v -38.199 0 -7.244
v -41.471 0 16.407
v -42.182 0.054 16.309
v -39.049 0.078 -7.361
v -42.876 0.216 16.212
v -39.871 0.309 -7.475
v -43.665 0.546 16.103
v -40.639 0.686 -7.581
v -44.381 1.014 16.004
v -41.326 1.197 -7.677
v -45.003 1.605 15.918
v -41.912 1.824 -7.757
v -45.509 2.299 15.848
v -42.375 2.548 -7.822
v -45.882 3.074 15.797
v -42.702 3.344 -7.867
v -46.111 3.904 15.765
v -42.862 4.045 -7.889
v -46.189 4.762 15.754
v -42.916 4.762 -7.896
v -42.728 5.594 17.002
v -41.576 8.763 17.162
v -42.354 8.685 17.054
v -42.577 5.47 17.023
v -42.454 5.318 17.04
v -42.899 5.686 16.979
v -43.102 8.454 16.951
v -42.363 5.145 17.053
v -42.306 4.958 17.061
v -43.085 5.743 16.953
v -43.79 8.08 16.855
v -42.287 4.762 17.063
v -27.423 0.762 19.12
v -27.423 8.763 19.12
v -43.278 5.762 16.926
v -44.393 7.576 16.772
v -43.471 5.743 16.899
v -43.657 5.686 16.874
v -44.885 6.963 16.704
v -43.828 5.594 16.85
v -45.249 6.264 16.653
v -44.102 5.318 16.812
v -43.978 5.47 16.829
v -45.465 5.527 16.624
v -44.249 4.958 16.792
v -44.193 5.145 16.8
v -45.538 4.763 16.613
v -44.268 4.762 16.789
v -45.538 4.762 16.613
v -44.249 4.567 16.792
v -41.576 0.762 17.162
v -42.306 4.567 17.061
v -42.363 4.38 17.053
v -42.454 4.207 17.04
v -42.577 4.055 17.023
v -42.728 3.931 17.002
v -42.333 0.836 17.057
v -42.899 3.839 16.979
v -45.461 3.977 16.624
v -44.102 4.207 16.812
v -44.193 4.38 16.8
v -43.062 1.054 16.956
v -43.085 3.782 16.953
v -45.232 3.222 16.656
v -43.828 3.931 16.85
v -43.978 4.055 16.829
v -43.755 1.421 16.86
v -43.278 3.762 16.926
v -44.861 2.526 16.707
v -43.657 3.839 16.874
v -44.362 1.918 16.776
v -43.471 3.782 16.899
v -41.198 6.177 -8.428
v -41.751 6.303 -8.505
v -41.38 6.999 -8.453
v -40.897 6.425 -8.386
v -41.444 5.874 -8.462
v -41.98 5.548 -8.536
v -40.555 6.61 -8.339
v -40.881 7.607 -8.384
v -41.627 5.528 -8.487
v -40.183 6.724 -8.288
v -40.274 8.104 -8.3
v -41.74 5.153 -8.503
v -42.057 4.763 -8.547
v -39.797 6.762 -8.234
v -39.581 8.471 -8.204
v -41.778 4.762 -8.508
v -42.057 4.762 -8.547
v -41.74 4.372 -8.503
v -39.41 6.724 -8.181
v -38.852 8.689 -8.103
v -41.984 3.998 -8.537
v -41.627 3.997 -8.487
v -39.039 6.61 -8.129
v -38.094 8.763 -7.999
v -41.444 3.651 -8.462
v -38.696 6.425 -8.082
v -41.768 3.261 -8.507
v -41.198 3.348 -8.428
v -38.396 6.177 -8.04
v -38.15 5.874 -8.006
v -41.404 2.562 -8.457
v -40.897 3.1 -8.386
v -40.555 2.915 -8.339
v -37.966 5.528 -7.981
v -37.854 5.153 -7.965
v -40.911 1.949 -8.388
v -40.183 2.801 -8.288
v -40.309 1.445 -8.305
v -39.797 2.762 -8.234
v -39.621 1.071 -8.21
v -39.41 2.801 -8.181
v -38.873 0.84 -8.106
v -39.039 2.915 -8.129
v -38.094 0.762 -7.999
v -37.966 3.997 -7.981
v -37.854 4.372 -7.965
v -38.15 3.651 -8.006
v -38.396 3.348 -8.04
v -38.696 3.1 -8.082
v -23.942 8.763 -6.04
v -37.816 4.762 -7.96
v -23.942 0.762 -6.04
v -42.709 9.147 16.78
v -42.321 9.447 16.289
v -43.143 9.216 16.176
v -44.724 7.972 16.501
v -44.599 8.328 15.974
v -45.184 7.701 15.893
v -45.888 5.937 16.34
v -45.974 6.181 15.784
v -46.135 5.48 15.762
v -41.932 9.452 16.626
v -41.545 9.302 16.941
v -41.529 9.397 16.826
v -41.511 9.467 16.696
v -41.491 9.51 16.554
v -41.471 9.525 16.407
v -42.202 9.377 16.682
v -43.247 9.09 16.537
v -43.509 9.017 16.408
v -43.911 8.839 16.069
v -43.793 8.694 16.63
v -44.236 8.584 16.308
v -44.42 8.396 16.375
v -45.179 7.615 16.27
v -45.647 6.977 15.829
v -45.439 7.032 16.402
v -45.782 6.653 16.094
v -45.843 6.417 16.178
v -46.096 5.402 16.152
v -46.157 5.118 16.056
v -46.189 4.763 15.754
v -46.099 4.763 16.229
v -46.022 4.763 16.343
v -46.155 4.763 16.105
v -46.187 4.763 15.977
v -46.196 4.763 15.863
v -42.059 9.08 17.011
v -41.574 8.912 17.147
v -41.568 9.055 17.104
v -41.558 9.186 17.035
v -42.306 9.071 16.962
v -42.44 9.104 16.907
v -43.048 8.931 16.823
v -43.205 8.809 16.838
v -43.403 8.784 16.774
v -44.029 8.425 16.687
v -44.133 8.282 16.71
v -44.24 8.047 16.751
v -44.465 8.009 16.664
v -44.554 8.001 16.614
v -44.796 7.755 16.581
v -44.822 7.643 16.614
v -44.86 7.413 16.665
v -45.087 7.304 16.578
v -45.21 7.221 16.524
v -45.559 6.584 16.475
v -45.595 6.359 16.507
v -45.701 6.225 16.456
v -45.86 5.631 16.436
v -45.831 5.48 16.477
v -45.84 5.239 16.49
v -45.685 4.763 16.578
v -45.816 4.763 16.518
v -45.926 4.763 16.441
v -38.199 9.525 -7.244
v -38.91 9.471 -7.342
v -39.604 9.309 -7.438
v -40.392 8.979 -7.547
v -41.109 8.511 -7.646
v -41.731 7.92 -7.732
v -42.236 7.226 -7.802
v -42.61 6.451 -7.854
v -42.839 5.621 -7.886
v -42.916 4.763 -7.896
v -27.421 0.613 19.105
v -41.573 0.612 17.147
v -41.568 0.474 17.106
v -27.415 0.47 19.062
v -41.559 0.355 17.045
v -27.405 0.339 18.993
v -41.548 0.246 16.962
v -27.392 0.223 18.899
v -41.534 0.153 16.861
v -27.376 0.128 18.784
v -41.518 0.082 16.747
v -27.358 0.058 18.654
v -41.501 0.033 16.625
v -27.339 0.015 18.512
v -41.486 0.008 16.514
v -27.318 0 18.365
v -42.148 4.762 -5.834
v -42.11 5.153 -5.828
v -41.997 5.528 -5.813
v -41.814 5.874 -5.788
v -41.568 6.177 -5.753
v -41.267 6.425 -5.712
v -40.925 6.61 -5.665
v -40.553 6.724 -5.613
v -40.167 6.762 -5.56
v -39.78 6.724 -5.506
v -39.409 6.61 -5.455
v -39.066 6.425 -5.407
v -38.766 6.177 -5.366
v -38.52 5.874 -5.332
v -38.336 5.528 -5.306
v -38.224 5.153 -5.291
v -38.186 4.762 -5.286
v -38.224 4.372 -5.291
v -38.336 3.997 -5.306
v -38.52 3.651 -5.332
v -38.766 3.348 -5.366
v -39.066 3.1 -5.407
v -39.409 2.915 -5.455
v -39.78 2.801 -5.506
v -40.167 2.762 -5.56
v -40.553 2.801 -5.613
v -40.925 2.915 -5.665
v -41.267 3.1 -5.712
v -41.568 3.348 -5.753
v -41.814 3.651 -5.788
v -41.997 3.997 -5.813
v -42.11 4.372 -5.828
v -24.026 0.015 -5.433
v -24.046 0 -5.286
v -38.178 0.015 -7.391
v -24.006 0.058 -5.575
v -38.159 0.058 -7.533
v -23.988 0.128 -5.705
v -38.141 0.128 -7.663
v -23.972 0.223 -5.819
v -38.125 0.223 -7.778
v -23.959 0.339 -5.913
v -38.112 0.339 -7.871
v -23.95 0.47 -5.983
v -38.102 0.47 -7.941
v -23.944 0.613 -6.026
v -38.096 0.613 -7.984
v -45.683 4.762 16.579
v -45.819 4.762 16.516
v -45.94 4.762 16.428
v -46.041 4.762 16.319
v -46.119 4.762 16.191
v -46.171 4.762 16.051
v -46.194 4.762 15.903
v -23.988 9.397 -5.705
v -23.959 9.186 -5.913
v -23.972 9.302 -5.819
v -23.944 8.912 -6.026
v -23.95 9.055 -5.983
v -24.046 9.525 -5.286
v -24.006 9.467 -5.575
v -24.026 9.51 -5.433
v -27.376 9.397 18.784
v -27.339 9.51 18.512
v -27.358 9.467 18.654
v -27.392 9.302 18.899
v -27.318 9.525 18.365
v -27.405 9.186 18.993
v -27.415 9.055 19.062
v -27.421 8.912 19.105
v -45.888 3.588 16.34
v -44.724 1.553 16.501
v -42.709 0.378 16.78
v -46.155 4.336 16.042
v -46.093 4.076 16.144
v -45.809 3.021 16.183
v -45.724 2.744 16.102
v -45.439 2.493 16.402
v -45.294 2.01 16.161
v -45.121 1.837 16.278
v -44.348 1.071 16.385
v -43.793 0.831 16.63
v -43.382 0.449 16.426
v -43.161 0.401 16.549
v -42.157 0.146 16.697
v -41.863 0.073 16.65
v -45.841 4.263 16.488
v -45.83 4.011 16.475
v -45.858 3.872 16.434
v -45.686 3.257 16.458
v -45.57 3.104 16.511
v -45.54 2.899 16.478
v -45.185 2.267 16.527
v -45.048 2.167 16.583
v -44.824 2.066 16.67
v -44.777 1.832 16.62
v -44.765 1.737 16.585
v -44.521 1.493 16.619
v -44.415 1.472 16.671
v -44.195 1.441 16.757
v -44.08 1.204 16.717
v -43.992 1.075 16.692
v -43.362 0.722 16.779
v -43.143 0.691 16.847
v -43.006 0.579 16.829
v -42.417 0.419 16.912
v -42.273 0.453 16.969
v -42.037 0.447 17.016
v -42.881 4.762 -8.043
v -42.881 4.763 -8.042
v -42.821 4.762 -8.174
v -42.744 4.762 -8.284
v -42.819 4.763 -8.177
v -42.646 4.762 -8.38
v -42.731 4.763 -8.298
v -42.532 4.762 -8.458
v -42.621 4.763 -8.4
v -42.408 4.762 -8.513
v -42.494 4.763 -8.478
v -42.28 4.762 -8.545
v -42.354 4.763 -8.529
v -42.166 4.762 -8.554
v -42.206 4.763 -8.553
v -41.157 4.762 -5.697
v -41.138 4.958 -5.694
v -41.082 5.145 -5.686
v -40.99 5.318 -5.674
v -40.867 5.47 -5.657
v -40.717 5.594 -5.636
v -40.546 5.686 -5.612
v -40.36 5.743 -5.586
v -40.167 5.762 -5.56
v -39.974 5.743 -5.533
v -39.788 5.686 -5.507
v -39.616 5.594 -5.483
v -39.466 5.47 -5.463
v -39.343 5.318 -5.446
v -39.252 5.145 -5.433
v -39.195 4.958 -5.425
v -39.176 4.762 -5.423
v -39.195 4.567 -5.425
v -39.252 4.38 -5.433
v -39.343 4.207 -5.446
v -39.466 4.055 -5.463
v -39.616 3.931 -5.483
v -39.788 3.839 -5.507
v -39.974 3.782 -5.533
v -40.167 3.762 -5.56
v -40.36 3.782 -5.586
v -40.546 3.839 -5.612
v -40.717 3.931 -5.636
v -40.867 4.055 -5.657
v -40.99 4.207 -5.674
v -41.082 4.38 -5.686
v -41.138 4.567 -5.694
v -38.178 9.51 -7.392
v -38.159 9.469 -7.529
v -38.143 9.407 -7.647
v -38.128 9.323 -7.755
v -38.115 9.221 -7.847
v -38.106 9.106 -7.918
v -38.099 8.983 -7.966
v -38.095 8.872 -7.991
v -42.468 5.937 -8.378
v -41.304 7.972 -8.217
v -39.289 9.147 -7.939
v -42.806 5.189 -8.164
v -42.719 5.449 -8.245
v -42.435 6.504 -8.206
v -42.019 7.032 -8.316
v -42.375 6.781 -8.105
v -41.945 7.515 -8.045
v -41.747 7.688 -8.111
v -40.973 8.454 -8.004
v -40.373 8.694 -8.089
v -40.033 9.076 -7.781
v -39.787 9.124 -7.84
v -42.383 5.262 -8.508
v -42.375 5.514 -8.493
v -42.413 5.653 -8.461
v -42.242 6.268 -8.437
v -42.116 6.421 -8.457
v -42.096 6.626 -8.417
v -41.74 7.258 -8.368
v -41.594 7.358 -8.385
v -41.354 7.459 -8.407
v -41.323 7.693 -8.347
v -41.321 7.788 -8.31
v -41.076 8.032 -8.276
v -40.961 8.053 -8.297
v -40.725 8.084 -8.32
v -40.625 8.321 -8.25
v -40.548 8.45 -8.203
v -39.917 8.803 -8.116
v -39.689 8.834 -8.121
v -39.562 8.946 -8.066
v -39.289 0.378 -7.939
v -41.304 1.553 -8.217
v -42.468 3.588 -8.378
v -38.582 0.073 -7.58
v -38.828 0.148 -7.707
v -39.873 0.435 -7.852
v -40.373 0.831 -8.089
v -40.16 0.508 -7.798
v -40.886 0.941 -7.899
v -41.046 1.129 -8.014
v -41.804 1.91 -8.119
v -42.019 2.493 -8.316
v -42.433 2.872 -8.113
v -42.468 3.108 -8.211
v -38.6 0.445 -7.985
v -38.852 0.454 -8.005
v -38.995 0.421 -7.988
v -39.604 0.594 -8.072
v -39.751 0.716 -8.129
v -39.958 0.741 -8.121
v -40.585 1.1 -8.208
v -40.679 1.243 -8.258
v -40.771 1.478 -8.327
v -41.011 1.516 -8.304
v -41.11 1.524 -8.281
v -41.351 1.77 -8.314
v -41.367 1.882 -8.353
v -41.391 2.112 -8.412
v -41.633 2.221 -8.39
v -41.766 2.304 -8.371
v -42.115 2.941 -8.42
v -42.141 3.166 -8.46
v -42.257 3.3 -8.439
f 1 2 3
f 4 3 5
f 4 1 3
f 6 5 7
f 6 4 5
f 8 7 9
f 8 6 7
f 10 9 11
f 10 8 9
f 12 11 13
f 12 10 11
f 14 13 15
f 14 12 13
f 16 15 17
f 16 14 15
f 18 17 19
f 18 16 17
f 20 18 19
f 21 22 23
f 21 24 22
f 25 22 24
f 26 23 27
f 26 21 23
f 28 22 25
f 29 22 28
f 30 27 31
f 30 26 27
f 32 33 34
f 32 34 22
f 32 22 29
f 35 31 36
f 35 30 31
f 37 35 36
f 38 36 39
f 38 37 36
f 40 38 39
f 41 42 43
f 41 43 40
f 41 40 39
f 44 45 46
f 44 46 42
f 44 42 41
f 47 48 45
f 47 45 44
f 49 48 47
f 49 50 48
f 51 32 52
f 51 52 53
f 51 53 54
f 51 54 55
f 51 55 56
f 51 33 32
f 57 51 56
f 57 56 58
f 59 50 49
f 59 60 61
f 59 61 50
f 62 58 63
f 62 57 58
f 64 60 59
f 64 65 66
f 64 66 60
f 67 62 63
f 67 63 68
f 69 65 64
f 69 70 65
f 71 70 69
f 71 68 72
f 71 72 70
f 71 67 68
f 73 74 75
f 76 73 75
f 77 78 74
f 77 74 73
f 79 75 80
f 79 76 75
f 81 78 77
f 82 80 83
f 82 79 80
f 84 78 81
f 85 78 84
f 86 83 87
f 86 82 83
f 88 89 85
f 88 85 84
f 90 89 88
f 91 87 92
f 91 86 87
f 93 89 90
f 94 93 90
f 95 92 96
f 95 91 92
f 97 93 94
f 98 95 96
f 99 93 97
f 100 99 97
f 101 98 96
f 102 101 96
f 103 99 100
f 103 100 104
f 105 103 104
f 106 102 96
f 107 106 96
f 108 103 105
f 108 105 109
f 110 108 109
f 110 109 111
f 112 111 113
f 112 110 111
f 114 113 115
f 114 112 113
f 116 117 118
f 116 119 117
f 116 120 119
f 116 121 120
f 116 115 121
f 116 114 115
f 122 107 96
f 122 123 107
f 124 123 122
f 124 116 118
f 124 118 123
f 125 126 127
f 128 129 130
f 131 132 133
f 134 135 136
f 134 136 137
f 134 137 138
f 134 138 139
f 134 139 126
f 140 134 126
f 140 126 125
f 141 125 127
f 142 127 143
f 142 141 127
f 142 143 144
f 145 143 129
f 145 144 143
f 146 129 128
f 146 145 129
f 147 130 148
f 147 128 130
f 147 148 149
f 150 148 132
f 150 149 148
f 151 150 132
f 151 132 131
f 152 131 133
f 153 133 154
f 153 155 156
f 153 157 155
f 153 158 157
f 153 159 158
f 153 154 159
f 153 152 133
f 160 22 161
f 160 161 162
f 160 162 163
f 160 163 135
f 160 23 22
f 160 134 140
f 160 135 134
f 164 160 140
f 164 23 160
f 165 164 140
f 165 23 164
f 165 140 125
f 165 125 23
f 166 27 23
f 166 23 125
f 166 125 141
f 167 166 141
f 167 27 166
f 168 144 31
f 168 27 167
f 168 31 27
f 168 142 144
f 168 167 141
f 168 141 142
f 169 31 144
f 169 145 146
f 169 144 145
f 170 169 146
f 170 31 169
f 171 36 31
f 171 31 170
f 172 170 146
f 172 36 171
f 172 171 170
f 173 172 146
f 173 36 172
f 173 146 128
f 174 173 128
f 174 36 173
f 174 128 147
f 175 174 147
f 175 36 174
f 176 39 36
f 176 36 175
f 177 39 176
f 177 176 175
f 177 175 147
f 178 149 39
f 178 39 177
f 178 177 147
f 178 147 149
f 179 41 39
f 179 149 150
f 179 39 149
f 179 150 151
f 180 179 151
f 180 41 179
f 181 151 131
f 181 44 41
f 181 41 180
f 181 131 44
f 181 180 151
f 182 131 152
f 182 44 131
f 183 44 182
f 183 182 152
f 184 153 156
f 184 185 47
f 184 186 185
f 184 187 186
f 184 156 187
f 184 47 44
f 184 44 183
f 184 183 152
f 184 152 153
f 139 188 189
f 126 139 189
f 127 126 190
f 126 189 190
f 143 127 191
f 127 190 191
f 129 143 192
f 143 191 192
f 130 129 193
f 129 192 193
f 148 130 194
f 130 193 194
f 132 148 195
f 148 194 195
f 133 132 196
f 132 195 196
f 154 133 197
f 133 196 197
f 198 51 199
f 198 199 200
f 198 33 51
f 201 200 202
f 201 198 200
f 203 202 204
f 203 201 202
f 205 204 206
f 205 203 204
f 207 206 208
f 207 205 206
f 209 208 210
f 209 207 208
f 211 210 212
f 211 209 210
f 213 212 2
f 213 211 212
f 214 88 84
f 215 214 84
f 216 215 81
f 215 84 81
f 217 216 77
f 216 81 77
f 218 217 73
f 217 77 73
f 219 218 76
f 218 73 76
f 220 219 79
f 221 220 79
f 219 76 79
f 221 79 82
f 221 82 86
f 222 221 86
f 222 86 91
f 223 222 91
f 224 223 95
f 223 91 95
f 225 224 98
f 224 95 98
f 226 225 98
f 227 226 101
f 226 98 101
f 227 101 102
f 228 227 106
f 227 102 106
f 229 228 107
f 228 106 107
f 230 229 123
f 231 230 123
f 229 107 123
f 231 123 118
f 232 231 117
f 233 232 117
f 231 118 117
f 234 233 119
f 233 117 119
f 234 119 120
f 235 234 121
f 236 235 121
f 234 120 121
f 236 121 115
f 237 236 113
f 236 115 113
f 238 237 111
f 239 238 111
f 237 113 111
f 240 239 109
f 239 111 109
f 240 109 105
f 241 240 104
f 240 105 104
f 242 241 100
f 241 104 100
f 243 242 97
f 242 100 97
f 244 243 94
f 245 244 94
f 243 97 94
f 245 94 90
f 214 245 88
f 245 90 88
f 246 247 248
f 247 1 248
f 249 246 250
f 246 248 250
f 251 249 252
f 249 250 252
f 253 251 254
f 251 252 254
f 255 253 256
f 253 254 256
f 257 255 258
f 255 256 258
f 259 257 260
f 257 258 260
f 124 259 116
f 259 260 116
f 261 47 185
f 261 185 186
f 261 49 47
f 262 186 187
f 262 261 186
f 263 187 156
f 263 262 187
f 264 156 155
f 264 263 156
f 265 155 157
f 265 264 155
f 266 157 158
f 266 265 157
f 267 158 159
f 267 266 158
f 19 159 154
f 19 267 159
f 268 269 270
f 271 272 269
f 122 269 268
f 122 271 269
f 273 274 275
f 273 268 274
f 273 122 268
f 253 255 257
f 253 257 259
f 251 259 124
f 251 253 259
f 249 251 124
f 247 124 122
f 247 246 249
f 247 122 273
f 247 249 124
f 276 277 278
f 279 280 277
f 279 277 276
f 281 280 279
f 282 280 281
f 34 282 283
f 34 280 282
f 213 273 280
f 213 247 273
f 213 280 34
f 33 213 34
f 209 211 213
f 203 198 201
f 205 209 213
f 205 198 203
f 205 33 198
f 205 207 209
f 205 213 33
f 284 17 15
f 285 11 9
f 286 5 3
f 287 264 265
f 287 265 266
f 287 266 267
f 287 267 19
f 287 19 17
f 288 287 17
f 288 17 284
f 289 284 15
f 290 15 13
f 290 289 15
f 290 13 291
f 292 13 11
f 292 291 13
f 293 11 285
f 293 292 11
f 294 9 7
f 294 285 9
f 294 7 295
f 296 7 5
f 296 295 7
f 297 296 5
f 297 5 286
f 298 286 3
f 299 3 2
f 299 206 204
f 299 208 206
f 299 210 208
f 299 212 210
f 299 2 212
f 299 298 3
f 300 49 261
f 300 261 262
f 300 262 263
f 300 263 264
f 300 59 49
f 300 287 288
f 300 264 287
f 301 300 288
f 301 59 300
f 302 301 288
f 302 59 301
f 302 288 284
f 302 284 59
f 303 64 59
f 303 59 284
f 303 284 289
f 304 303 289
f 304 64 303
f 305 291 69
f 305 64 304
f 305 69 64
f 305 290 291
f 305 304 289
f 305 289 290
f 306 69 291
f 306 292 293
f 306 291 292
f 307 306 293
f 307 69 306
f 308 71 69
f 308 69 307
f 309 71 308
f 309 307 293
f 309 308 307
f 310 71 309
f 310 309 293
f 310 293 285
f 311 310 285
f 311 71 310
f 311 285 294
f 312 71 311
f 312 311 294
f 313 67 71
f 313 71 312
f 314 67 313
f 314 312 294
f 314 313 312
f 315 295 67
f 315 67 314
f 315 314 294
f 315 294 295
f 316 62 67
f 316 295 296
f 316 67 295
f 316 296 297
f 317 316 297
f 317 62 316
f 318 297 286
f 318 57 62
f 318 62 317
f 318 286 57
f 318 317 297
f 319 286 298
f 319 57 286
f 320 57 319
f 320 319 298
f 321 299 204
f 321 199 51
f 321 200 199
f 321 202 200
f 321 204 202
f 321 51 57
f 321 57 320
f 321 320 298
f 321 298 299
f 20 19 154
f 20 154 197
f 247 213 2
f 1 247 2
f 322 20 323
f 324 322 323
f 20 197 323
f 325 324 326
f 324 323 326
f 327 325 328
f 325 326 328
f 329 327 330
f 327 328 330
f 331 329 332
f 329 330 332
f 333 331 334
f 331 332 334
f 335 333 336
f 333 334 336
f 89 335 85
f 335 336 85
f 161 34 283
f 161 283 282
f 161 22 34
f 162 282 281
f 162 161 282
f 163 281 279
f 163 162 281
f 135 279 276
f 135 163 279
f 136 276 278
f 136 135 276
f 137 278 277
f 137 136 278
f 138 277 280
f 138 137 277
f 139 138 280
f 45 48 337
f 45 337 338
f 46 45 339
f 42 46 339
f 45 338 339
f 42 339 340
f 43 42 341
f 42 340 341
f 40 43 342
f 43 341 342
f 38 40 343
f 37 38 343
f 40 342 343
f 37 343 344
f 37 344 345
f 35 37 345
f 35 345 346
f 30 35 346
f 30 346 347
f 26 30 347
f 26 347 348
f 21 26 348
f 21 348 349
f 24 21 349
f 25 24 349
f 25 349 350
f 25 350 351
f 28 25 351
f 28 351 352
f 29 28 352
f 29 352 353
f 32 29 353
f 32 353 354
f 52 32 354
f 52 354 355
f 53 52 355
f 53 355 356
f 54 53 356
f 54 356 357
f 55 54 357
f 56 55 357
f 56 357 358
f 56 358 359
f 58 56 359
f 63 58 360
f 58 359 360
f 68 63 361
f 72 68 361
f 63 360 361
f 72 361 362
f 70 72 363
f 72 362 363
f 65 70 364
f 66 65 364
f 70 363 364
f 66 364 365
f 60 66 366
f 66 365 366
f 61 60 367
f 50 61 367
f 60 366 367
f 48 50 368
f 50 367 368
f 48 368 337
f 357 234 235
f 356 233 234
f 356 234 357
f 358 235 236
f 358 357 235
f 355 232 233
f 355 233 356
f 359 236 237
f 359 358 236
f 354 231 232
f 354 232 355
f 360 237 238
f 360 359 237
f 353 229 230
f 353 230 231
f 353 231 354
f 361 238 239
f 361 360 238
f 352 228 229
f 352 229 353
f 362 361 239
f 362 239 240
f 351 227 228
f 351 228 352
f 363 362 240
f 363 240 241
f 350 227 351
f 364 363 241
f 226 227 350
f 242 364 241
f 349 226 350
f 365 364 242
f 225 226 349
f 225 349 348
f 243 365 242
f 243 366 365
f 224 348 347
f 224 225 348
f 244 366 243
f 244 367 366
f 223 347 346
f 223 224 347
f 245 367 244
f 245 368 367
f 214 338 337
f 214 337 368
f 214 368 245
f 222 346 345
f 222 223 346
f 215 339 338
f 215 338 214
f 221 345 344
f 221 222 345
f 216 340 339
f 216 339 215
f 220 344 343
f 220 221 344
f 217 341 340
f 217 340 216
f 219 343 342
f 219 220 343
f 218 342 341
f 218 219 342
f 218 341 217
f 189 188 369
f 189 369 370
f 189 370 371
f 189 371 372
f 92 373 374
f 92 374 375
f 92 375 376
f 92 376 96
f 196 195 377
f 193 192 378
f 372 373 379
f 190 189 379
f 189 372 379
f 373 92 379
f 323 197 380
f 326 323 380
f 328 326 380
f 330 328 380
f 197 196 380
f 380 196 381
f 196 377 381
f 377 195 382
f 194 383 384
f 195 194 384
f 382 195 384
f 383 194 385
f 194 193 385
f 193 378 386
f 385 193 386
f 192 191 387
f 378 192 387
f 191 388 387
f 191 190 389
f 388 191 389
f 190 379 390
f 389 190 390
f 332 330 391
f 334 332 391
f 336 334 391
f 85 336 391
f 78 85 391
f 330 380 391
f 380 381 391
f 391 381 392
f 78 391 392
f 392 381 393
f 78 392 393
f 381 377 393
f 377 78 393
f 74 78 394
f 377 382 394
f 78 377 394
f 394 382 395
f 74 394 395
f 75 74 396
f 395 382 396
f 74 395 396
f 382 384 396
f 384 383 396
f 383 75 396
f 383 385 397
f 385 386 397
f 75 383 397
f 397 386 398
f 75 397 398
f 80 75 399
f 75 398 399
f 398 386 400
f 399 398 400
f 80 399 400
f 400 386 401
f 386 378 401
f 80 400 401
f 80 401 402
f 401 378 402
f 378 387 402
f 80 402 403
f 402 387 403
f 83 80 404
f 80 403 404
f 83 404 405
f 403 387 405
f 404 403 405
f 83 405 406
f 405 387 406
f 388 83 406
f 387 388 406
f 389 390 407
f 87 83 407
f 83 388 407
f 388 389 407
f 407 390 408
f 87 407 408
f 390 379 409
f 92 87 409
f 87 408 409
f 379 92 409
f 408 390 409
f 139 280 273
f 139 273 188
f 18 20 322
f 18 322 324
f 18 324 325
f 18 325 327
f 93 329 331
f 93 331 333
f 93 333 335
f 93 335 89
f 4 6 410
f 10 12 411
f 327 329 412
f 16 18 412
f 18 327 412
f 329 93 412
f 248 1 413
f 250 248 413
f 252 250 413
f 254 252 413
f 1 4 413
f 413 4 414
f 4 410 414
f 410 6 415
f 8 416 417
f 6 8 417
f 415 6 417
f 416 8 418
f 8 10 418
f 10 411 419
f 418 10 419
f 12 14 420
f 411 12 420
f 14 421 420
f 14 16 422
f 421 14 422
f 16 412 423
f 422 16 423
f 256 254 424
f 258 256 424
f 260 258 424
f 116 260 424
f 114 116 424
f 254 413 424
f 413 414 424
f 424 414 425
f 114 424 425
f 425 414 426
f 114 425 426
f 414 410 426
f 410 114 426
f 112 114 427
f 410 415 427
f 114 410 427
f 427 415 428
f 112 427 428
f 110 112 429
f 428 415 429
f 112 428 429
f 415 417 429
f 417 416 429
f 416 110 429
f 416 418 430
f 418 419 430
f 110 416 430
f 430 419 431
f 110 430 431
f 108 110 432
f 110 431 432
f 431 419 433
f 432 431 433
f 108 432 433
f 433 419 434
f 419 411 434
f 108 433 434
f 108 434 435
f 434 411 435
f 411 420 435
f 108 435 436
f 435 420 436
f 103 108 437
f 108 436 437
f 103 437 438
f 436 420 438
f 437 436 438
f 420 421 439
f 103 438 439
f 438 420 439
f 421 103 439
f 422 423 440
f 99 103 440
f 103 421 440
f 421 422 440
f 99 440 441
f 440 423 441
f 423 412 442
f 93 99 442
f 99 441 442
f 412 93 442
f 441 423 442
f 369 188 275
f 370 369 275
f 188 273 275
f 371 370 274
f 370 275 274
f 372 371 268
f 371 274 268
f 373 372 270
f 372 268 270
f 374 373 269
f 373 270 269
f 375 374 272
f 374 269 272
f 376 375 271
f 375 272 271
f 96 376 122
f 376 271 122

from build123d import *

# Parameters (mm, degrees)
BOSS_EXTRUDE1_DEPTH = 9.525
SKETCH3_R           = 2
CUT_EXTRUDE1_DEPTH  = 2.7
SKETCH4_R           = 1
CUT_EXTRUDE2_DEPTH  = 51.984772229
FILLET2_R           = 4.7625
FILLET3_R           = 0.762


with BuildPart() as part:
    # Sketch1 → Boss-Extrude1 (new body)
    with BuildSketch(Plane(origin=(0, 0, 0), x_dir=(1, 0, 0), z_dir=(0, 1, 0))):
        Polygon((-27.422743224, -19.119856123), (-46.29298428, -16.509012872), (-42.811859946, 8.651308536), (-23.941618889, 6.040465285), align=None)
    extrude(amount=BOSS_EXTRUDE1_DEPTH)

    # Sketch3 → Cut-Extrude1 (cut)
    with BuildSketch(Plane(origin=(0.316670388, 0, -2.684144047), x_dir=(-0.9905638349724136, 0, -0.13705213914691383), z_dir=(0.13705213914691383, 0, -0.9905638349724136))):
        with Locations((40.495544979, 4.7625)):
            Circle(SKETCH3_R)
    extrude(amount=-CUT_EXTRUDE1_DEPTH, mode=Mode.SUBTRACT)

    # Sketch4 → Cut-Extrude2 (cut, through all)
    with BuildSketch(Plane(origin=(0.000303759, 0, -0.00219546), x_dir=(-0.9905638349724136, 0, -0.13705213914691383), z_dir=(0.1370521391469138, 0, -0.9905638349724135))):
        with Locations((40.549730429, 4.7625)):
            Circle(SKETCH4_R)
    extrude(amount=-CUT_EXTRUDE2_DEPTH, mode=Mode.SUBTRACT)

    # Fillet2
    fillet2_edges = [part.edges().sort_by_distance(p)[0] for p in [
        (-44.552422113, 0, 3.928852168),
        (-44.552422113, 9.525, 3.928852168),
    ]]
    fillet(fillet2_edges, radius=FILLET2_R - 0.0001)  # a hair under: the kernel refuses the full size

    # Fillet3
    fillet3_edges = [part.edges().sort_by_distance(p)[0] for p in [
        (-34.499133148, 9.525, 18.140783052),
        (-34.499133148, 0, 18.140783052),
        (-44.911271882, 1.394874665, 16.700183429),
        (-44.911271882, 8.130125335, 16.700183429),
        (-41.430147548, 1.394874665, -8.460137979),
        (-41.430147548, 8.130125335, -8.460137979),
        (-31.018008814, 0, -7.019538357),
        (-31.018008814, 9.525, -7.019538357),
    ]]
    fillet(fillet3_edges, radius=FILLET3_R)


solid = part.part
